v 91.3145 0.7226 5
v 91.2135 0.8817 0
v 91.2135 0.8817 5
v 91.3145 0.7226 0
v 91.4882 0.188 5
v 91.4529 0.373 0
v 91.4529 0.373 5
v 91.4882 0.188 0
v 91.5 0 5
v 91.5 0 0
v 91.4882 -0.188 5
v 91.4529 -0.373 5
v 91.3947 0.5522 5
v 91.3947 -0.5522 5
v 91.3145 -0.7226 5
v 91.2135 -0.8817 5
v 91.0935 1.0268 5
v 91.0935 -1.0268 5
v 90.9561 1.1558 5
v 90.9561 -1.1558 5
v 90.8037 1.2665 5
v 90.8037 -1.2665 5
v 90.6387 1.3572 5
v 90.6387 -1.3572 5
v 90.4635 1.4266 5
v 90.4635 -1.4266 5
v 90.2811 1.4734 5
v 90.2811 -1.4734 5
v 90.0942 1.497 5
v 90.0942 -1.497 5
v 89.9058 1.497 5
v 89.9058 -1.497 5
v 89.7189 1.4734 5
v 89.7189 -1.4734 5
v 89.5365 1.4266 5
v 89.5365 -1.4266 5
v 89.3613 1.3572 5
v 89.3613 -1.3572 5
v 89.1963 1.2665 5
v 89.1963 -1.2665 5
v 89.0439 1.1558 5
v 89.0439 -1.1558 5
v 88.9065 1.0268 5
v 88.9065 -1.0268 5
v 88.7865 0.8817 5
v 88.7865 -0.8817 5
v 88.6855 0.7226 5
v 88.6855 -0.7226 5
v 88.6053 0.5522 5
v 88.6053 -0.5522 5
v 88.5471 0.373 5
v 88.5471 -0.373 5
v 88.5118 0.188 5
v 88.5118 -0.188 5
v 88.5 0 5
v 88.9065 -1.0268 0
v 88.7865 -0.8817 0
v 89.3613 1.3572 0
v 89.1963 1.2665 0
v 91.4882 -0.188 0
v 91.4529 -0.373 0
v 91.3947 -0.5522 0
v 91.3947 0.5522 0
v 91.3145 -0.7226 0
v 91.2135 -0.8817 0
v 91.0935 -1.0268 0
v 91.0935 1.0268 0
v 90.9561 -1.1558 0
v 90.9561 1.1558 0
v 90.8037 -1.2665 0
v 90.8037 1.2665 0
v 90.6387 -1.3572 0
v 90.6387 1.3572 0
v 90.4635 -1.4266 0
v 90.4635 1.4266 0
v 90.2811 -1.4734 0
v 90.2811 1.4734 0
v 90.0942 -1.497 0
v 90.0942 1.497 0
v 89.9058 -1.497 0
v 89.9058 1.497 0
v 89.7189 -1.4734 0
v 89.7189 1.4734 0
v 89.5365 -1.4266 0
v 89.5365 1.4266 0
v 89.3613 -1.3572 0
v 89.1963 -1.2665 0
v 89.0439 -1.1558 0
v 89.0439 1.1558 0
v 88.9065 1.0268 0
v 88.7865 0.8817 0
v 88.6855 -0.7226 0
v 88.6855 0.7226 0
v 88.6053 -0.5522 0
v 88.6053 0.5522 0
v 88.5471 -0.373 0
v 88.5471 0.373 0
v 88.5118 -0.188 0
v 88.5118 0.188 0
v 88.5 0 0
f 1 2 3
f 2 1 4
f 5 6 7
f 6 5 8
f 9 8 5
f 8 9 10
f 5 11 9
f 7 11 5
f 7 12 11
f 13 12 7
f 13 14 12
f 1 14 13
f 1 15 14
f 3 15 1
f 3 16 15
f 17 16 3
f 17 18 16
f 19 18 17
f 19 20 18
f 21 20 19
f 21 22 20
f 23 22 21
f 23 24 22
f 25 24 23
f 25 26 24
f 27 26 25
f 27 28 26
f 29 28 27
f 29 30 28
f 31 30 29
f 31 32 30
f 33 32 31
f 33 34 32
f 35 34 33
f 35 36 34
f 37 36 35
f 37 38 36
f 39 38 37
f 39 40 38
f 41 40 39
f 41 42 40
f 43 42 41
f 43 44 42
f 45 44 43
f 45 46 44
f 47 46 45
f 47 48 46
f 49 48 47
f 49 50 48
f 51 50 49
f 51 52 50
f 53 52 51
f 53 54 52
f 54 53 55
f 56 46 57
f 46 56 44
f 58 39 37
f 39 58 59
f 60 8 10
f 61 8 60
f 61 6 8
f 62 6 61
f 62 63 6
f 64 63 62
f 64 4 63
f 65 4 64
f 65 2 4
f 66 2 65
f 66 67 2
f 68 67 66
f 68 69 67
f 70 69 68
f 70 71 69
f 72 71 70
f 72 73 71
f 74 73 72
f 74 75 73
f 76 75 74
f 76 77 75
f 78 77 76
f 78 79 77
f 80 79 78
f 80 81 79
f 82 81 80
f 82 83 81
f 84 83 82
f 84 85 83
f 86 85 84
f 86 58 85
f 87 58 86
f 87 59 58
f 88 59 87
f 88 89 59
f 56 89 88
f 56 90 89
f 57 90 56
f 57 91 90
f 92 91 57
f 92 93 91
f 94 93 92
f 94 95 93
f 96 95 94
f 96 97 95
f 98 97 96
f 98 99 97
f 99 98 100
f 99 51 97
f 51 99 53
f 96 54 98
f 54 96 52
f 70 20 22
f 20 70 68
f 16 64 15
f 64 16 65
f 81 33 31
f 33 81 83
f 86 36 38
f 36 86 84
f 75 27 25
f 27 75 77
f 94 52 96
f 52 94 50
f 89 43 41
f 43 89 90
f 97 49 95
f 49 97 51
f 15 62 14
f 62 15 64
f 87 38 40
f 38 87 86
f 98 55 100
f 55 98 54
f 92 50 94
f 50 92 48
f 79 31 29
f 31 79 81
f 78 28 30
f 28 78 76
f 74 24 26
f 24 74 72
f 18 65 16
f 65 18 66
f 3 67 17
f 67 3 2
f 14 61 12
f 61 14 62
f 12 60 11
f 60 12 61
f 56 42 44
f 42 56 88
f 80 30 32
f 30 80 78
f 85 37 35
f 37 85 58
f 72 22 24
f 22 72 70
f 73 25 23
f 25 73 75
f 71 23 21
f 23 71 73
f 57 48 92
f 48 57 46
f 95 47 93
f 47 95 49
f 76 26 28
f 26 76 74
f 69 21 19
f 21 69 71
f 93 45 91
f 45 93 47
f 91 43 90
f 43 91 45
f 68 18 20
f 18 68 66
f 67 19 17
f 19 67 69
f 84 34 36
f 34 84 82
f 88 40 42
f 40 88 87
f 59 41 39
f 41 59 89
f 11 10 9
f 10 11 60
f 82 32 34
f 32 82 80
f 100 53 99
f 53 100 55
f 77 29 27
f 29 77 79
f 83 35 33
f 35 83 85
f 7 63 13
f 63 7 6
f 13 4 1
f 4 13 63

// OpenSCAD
// SPDX-FileCopyrightText: 2014-2026 The Beach Lab <https://beachlab.org>
// SPDX-License-Identifier: MIT
// Alphabets New Spool
$fn=(50);

// Parameters
ncards=64; // number of cards
sdiam=85; // diameter of the spool mm
e=2; // 3d printed part thickness mm

// Variables
srad=sdiam/2;
angle=360/ncards; // angle of rotation

// define copy_mirror function
module copy_mirror(vec=[0,1,0])
{
    children();
    mirror(vec) children();
} 

// Define axis motor
module axismotor() {
intersection() {square(size = [3, 6], center = true); circle(2.5);}
}

// Define axis support
module axis() {
circle(1.5);
}

// define aro
module aro() {
difference(){
    difference() { circle(srad); circle(srad-5);}
    for (a=[0:angle:360]){
    rotate(a) 
    translate([srad-2.5,0,0]) circle(1.5);
    }
}
}

// CODE STARTS HERE

linear_extrude(height = e) {
union(){    
aro();
    difference() {
        intersection() {
            union() {
                translate ([srad,0,0]) aro();
                translate ([-srad,0,0])  aro();
                circle (6.5);
                }
            circle(srad-5);
        }

    axismotor();
    }
}    
}

translate ([sdiam+5,0,0])
        union() {
        linear_extrude(height = 5) {circle(1.5);}
        linear_extrude(height = e) {
        union(){    
        aro();
                intersection() {
                    union() {
                        translate ([srad,0,0]) aro();
                        translate ([-srad,0,0])  aro();
                        circle (6.5);
                        }
                    circle(srad-5);
                }

        }    
        }
    }
